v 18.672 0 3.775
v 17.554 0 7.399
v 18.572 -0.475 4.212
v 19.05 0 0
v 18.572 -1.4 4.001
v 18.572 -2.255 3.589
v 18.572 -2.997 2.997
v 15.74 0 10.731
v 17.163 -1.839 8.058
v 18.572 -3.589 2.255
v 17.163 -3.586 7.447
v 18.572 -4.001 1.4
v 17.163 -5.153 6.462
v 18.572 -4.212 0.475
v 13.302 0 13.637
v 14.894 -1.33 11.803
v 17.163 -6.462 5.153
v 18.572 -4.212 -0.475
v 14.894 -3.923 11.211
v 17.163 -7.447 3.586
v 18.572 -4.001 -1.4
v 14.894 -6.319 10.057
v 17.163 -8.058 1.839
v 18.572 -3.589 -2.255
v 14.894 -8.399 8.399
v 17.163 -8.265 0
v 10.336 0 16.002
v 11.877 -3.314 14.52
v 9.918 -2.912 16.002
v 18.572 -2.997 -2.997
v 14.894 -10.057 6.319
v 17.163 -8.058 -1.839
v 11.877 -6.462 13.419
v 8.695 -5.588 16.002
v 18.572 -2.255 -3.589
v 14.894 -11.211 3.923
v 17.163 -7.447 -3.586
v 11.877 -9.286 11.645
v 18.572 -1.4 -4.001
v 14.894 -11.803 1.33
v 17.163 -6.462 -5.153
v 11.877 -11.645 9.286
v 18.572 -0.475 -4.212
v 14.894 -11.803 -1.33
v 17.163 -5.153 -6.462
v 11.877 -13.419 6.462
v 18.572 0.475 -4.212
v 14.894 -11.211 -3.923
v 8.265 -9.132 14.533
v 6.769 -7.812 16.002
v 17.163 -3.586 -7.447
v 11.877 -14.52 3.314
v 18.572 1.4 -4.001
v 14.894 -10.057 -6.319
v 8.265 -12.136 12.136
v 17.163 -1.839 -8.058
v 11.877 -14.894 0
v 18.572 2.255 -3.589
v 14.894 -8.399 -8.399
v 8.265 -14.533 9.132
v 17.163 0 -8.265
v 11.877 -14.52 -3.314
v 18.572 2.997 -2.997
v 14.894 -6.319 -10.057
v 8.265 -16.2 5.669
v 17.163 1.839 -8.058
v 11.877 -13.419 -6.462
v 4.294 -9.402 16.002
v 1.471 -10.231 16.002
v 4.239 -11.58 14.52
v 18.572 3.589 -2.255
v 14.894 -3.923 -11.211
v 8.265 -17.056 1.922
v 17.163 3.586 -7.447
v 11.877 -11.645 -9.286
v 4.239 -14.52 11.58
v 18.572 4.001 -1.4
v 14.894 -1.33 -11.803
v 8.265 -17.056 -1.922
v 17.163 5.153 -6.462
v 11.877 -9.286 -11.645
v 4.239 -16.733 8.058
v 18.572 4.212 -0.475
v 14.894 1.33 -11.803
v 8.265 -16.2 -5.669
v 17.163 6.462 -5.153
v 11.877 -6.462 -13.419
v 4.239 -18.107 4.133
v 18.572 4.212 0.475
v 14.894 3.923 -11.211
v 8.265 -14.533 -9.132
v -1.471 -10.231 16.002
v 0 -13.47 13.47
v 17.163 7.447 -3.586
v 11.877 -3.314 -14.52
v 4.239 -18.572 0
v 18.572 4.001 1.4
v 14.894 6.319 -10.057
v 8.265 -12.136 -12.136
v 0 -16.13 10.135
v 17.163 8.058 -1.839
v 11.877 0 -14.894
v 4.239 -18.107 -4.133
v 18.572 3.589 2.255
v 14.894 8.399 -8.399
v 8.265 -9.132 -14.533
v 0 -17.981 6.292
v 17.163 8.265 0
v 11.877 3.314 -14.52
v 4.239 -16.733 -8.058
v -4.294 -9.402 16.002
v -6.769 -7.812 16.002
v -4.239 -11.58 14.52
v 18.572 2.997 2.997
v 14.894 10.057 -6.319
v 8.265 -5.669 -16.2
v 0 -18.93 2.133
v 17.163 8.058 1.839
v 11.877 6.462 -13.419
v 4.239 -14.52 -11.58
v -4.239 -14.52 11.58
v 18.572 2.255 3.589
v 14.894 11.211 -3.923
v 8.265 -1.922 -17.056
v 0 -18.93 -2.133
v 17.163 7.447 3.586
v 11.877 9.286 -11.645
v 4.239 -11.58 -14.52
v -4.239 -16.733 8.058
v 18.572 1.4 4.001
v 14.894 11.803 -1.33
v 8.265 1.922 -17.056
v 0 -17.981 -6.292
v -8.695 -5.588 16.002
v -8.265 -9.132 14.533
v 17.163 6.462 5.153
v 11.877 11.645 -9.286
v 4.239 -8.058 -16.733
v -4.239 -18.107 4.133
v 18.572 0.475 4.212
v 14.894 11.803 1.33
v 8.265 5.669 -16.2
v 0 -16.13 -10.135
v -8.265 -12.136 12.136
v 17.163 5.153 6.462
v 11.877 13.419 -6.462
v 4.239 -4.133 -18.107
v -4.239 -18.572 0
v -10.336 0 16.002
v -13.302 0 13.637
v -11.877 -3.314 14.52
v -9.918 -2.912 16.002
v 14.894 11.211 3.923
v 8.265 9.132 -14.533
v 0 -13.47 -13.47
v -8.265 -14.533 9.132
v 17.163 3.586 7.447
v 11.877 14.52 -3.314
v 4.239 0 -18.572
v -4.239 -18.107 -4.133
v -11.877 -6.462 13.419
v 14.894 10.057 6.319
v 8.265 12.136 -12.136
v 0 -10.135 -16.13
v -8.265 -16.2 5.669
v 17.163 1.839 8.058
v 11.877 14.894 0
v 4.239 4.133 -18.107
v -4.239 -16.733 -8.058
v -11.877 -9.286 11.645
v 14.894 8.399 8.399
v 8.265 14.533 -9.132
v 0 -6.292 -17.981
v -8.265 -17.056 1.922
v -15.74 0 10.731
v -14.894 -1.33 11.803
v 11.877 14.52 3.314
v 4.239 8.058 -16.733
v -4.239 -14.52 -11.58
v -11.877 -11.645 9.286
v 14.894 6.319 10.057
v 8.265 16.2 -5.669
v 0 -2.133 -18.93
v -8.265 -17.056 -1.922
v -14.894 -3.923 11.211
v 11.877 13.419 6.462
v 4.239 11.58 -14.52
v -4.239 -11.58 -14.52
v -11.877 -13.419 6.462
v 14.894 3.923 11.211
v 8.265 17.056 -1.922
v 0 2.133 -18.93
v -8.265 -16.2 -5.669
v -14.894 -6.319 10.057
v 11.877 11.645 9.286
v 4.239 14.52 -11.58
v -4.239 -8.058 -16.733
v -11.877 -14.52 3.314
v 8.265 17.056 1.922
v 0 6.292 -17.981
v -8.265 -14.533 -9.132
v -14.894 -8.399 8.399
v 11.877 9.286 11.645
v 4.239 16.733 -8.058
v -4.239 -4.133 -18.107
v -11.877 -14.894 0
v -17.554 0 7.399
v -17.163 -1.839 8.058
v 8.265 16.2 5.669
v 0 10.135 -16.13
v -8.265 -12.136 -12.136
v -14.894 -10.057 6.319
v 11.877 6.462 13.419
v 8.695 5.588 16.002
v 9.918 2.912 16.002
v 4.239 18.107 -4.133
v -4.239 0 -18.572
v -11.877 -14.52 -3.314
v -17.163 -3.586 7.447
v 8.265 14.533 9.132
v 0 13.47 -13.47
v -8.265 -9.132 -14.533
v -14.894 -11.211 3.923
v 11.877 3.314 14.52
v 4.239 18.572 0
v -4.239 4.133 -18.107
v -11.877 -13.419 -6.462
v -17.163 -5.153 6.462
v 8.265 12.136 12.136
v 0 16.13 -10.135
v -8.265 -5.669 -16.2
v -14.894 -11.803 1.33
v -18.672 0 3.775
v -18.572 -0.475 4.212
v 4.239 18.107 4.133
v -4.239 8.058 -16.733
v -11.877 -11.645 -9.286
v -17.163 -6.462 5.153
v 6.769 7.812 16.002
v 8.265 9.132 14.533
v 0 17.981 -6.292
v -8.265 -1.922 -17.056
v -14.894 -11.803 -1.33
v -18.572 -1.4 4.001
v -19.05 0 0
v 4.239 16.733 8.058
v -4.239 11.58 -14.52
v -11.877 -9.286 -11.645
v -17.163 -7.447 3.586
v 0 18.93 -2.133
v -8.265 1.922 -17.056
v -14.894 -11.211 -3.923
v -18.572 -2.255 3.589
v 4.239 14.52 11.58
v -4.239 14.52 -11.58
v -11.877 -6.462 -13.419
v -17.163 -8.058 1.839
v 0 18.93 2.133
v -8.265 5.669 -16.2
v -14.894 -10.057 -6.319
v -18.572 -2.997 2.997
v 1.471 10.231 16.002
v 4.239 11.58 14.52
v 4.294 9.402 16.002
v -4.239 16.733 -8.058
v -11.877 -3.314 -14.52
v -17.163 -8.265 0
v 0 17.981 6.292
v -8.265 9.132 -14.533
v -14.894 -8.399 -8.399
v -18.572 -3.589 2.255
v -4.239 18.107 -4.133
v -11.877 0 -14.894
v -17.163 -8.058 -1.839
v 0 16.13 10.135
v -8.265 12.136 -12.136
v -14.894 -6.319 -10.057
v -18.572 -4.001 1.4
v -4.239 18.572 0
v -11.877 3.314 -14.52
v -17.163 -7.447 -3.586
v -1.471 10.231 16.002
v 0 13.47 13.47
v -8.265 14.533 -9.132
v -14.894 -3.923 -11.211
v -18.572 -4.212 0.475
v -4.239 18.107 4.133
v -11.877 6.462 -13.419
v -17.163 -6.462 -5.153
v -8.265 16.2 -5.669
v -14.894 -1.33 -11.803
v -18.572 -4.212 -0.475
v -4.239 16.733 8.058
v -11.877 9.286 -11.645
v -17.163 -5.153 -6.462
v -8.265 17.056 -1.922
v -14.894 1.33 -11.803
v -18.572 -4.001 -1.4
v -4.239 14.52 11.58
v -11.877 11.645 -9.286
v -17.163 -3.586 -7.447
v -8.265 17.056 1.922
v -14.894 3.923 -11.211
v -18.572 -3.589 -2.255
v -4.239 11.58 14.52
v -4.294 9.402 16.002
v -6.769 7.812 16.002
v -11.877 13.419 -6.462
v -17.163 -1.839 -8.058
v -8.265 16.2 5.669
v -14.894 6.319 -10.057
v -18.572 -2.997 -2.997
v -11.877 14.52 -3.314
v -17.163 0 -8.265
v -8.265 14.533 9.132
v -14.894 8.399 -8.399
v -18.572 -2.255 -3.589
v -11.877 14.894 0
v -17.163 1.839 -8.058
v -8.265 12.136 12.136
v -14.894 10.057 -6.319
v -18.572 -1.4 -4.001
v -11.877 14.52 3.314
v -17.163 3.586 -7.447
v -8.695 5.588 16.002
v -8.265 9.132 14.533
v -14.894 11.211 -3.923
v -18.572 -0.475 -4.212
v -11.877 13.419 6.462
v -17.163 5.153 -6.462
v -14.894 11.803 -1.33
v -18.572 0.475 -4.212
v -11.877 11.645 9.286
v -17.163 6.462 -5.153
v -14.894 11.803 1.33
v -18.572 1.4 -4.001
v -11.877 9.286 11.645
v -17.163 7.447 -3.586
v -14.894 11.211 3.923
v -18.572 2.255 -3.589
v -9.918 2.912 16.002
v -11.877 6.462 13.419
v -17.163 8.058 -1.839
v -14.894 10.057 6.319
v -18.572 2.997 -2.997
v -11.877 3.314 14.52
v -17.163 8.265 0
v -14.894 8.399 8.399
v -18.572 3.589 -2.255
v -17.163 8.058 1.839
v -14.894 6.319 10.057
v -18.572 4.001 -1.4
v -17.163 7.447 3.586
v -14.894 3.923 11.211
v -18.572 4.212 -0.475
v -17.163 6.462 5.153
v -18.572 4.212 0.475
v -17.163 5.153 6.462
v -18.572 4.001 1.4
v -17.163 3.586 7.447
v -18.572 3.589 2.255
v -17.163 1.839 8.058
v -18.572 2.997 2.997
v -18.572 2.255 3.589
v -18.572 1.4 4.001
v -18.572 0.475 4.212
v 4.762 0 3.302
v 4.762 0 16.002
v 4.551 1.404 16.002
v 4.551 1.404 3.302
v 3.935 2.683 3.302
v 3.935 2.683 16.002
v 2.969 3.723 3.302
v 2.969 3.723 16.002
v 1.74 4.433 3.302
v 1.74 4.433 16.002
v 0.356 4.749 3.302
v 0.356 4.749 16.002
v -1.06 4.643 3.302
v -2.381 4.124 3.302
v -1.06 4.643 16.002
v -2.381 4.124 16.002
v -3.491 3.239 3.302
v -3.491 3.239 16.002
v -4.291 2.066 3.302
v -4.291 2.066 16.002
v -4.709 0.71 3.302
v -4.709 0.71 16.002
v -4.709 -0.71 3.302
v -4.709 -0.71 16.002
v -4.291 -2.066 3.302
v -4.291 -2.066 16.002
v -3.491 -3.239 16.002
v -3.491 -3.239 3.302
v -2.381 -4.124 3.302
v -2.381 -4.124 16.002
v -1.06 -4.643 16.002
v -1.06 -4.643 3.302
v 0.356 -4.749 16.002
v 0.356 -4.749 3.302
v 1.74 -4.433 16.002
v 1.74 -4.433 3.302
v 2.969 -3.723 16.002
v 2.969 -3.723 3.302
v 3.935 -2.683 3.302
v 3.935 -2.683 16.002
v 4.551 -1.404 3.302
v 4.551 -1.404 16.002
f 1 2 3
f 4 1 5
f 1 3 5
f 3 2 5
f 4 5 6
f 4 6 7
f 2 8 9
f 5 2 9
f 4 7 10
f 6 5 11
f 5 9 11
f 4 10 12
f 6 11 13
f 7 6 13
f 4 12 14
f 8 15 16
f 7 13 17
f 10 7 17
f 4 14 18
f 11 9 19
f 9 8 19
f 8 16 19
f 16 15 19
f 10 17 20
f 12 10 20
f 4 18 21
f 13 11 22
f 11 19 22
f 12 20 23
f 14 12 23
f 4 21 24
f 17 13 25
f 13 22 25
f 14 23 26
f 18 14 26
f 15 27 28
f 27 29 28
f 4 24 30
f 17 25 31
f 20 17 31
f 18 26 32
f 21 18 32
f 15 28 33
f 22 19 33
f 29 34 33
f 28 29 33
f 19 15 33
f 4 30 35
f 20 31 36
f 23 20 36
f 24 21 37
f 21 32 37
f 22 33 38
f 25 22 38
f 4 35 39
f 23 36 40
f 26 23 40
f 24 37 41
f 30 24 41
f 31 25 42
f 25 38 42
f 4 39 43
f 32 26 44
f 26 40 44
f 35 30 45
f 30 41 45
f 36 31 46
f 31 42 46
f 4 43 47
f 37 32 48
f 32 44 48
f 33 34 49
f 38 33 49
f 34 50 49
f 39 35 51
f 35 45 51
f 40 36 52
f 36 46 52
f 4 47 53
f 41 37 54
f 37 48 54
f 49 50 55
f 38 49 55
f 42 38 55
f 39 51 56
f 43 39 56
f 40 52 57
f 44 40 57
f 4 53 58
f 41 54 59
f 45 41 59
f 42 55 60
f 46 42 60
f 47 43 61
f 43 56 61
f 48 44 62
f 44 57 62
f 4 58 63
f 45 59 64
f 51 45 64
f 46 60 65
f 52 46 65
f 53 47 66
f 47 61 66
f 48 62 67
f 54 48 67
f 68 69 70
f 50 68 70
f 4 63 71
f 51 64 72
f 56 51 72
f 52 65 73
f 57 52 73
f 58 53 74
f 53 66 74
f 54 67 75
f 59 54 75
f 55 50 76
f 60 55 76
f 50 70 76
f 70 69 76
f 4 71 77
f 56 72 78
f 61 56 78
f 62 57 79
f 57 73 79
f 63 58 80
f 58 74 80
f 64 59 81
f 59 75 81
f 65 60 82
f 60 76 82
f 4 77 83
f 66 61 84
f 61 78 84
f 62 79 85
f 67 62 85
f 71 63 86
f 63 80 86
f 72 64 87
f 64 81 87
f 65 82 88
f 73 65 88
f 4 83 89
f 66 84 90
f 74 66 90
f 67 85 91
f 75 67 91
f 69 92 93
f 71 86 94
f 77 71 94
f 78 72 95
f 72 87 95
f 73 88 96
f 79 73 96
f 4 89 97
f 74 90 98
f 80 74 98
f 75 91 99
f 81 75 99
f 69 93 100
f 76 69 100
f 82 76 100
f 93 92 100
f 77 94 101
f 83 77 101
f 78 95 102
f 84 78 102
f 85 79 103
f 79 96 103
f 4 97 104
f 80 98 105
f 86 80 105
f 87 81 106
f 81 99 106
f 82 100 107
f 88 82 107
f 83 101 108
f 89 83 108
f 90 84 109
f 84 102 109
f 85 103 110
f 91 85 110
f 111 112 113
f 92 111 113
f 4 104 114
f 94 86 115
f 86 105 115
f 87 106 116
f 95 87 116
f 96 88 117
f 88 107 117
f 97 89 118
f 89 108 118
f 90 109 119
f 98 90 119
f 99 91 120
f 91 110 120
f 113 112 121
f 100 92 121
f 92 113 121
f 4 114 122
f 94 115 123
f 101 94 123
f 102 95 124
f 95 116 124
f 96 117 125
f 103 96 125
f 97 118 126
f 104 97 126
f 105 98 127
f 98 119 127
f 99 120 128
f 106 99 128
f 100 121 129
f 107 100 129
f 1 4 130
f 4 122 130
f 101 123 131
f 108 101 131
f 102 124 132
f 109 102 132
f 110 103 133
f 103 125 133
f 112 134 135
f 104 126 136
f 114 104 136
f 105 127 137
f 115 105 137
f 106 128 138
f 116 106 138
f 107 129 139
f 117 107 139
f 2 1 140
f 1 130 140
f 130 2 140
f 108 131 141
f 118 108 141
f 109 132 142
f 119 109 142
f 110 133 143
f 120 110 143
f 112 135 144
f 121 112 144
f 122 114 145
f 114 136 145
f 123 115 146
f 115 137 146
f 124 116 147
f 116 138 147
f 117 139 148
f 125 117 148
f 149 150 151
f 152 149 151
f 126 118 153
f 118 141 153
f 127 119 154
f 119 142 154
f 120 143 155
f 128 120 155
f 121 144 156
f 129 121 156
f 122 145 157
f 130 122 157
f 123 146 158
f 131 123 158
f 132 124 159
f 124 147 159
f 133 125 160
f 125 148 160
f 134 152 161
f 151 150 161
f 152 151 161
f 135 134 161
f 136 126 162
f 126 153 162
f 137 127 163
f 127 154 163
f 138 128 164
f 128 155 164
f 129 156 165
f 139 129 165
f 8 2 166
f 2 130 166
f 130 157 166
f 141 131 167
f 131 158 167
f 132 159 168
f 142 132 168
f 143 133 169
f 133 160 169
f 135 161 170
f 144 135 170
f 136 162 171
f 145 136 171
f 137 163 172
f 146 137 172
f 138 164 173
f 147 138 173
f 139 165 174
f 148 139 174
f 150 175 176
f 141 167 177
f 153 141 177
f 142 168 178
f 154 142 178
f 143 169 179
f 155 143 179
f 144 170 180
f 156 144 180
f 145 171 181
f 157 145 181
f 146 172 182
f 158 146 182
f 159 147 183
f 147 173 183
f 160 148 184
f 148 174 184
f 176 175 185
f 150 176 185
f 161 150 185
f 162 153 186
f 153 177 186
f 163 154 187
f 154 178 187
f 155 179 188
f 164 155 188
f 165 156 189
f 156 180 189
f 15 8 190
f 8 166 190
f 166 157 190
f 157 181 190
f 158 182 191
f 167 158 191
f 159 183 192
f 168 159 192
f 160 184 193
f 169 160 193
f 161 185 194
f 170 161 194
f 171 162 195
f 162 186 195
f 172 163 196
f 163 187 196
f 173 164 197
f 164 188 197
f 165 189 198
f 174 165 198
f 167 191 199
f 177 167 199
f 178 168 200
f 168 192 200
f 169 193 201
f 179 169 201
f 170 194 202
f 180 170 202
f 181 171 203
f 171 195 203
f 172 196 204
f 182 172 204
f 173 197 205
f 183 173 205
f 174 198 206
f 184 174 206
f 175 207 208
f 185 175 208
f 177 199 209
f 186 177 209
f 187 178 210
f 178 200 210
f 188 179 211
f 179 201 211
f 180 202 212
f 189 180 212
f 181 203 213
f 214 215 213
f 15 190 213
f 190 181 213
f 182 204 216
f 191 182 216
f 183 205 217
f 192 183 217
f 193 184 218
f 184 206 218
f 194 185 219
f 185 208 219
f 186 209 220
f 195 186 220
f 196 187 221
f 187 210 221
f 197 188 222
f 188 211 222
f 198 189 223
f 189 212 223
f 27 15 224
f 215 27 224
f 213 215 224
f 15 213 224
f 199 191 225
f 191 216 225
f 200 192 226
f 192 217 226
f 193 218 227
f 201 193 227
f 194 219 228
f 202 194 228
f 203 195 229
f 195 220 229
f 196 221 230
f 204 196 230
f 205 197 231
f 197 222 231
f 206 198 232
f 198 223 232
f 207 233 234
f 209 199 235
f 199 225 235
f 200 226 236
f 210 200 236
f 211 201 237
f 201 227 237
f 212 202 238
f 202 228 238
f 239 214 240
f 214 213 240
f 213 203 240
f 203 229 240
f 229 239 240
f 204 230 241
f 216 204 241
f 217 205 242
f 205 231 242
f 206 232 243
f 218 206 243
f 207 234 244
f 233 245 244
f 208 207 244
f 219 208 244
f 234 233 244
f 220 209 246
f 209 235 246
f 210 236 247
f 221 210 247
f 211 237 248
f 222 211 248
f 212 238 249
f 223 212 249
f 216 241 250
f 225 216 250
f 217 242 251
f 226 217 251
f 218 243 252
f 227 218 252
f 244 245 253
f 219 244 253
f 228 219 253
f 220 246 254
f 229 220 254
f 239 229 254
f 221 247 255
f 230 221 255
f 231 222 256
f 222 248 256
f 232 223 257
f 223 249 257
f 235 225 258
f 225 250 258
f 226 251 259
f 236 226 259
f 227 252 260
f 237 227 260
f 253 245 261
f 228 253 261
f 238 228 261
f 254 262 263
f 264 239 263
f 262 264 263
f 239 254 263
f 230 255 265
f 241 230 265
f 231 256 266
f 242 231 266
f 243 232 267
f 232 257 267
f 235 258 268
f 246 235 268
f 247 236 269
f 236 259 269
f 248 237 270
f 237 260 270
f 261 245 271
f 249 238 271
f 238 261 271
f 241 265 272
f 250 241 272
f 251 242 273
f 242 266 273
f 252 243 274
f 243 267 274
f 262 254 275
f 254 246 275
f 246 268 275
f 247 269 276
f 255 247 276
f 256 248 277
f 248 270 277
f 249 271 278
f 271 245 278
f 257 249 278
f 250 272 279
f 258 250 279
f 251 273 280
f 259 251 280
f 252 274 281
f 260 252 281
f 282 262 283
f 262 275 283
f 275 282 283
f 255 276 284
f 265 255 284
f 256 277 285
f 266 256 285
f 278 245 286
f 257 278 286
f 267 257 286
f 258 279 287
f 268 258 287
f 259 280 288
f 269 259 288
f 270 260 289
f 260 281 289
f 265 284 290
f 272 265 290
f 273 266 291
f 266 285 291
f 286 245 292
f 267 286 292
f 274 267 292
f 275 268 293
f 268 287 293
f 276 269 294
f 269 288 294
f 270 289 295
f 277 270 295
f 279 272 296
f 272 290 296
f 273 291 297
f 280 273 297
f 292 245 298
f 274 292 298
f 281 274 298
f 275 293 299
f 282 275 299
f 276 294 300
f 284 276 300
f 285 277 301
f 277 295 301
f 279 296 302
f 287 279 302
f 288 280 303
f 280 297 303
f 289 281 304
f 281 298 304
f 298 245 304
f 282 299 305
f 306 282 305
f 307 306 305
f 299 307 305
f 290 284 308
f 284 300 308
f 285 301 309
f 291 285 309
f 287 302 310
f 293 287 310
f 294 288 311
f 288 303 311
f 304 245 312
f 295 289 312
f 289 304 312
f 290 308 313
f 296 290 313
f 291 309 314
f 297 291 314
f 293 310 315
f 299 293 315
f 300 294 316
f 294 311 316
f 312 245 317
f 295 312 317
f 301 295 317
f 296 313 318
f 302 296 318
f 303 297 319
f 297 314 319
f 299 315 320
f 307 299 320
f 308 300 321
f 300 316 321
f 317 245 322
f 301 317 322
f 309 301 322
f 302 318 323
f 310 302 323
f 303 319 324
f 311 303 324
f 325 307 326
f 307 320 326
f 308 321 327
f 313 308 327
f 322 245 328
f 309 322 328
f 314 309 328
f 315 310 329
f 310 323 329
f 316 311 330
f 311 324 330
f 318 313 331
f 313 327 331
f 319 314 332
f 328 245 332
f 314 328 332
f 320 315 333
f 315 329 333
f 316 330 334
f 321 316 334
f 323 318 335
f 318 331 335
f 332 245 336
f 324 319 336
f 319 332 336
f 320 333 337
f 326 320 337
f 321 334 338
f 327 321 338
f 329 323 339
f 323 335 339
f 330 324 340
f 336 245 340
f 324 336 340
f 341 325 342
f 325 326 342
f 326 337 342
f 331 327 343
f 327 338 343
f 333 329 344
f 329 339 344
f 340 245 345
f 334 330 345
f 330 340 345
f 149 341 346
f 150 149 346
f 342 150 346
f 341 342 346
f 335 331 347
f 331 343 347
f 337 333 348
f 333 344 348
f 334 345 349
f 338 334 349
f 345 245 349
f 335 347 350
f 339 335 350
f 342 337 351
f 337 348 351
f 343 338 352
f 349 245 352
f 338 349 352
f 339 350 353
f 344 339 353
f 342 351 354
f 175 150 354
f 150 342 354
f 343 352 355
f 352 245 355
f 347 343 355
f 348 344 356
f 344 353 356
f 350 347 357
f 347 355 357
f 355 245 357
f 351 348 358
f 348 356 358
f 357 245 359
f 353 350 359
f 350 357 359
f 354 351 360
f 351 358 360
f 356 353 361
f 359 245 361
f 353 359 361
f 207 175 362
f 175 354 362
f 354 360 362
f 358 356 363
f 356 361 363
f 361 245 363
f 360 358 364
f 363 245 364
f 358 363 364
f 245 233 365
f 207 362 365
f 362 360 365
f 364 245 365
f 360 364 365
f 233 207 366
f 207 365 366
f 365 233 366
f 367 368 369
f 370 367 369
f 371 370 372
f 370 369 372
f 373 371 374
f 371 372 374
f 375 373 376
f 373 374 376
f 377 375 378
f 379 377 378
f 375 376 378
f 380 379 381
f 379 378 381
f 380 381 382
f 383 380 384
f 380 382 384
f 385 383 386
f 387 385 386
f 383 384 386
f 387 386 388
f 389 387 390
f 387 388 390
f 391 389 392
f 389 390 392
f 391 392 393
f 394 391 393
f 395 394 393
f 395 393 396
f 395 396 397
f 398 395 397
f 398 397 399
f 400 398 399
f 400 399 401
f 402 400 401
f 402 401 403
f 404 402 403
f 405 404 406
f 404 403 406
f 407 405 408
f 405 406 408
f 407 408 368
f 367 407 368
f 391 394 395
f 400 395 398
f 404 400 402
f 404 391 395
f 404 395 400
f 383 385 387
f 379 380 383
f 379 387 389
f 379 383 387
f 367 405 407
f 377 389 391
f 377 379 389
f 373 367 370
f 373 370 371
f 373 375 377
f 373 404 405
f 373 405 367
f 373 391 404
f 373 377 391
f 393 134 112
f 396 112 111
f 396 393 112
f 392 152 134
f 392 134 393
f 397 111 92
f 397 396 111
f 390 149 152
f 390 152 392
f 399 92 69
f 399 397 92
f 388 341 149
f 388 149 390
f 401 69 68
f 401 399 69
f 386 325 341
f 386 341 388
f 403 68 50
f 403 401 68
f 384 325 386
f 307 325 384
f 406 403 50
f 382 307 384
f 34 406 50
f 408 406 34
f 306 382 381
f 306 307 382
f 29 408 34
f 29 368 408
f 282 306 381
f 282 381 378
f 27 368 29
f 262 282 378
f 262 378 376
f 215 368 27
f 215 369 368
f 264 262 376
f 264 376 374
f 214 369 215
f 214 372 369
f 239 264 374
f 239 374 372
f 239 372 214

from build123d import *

# Parameters (mm, degrees)
SKETCH3_W          = 37.025629418
SKETCH3_H          = 29.353652152
CUT_EXTRUDE1_DEPTH = 3.048
SKETCH4_R          = 4.7625
CUT_EXTRUDE2_DEPTH = 12.7


with BuildPart() as part:
    # Sketch1 → Revolve6 (revolve)
    with BuildSketch(Plane(origin=(0, 0, 0), x_dir=(1, 0, 0), z_dir=(0, 1, 0))):
        with BuildLine():
            Line((0, 0), (19.05, 0))
            ThreePointArc((19.05, 0), (0, -19.05), (-19.05, 0))
            Line((-19.05, 0), (0, 0))
        make_face()
    revolve(axis=Axis((-19.05, 0, 0), (1, 0, 0)))

    # Sketch3 → Cut-Extrude1 (cut)
    with BuildSketch(Plane.XY.offset(16.002)):
        Rectangle(SKETCH3_W, SKETCH3_H)
    extrude(amount=CUT_EXTRUDE1_DEPTH, mode=Mode.SUBTRACT)

    # Sketch4 → Cut-Extrude2 (cut)
    with BuildSketch(Plane.XY.offset(16.002)):
        Circle(SKETCH4_R)
    extrude(amount=-CUT_EXTRUDE2_DEPTH, mode=Mode.SUBTRACT)


solid = part.part
